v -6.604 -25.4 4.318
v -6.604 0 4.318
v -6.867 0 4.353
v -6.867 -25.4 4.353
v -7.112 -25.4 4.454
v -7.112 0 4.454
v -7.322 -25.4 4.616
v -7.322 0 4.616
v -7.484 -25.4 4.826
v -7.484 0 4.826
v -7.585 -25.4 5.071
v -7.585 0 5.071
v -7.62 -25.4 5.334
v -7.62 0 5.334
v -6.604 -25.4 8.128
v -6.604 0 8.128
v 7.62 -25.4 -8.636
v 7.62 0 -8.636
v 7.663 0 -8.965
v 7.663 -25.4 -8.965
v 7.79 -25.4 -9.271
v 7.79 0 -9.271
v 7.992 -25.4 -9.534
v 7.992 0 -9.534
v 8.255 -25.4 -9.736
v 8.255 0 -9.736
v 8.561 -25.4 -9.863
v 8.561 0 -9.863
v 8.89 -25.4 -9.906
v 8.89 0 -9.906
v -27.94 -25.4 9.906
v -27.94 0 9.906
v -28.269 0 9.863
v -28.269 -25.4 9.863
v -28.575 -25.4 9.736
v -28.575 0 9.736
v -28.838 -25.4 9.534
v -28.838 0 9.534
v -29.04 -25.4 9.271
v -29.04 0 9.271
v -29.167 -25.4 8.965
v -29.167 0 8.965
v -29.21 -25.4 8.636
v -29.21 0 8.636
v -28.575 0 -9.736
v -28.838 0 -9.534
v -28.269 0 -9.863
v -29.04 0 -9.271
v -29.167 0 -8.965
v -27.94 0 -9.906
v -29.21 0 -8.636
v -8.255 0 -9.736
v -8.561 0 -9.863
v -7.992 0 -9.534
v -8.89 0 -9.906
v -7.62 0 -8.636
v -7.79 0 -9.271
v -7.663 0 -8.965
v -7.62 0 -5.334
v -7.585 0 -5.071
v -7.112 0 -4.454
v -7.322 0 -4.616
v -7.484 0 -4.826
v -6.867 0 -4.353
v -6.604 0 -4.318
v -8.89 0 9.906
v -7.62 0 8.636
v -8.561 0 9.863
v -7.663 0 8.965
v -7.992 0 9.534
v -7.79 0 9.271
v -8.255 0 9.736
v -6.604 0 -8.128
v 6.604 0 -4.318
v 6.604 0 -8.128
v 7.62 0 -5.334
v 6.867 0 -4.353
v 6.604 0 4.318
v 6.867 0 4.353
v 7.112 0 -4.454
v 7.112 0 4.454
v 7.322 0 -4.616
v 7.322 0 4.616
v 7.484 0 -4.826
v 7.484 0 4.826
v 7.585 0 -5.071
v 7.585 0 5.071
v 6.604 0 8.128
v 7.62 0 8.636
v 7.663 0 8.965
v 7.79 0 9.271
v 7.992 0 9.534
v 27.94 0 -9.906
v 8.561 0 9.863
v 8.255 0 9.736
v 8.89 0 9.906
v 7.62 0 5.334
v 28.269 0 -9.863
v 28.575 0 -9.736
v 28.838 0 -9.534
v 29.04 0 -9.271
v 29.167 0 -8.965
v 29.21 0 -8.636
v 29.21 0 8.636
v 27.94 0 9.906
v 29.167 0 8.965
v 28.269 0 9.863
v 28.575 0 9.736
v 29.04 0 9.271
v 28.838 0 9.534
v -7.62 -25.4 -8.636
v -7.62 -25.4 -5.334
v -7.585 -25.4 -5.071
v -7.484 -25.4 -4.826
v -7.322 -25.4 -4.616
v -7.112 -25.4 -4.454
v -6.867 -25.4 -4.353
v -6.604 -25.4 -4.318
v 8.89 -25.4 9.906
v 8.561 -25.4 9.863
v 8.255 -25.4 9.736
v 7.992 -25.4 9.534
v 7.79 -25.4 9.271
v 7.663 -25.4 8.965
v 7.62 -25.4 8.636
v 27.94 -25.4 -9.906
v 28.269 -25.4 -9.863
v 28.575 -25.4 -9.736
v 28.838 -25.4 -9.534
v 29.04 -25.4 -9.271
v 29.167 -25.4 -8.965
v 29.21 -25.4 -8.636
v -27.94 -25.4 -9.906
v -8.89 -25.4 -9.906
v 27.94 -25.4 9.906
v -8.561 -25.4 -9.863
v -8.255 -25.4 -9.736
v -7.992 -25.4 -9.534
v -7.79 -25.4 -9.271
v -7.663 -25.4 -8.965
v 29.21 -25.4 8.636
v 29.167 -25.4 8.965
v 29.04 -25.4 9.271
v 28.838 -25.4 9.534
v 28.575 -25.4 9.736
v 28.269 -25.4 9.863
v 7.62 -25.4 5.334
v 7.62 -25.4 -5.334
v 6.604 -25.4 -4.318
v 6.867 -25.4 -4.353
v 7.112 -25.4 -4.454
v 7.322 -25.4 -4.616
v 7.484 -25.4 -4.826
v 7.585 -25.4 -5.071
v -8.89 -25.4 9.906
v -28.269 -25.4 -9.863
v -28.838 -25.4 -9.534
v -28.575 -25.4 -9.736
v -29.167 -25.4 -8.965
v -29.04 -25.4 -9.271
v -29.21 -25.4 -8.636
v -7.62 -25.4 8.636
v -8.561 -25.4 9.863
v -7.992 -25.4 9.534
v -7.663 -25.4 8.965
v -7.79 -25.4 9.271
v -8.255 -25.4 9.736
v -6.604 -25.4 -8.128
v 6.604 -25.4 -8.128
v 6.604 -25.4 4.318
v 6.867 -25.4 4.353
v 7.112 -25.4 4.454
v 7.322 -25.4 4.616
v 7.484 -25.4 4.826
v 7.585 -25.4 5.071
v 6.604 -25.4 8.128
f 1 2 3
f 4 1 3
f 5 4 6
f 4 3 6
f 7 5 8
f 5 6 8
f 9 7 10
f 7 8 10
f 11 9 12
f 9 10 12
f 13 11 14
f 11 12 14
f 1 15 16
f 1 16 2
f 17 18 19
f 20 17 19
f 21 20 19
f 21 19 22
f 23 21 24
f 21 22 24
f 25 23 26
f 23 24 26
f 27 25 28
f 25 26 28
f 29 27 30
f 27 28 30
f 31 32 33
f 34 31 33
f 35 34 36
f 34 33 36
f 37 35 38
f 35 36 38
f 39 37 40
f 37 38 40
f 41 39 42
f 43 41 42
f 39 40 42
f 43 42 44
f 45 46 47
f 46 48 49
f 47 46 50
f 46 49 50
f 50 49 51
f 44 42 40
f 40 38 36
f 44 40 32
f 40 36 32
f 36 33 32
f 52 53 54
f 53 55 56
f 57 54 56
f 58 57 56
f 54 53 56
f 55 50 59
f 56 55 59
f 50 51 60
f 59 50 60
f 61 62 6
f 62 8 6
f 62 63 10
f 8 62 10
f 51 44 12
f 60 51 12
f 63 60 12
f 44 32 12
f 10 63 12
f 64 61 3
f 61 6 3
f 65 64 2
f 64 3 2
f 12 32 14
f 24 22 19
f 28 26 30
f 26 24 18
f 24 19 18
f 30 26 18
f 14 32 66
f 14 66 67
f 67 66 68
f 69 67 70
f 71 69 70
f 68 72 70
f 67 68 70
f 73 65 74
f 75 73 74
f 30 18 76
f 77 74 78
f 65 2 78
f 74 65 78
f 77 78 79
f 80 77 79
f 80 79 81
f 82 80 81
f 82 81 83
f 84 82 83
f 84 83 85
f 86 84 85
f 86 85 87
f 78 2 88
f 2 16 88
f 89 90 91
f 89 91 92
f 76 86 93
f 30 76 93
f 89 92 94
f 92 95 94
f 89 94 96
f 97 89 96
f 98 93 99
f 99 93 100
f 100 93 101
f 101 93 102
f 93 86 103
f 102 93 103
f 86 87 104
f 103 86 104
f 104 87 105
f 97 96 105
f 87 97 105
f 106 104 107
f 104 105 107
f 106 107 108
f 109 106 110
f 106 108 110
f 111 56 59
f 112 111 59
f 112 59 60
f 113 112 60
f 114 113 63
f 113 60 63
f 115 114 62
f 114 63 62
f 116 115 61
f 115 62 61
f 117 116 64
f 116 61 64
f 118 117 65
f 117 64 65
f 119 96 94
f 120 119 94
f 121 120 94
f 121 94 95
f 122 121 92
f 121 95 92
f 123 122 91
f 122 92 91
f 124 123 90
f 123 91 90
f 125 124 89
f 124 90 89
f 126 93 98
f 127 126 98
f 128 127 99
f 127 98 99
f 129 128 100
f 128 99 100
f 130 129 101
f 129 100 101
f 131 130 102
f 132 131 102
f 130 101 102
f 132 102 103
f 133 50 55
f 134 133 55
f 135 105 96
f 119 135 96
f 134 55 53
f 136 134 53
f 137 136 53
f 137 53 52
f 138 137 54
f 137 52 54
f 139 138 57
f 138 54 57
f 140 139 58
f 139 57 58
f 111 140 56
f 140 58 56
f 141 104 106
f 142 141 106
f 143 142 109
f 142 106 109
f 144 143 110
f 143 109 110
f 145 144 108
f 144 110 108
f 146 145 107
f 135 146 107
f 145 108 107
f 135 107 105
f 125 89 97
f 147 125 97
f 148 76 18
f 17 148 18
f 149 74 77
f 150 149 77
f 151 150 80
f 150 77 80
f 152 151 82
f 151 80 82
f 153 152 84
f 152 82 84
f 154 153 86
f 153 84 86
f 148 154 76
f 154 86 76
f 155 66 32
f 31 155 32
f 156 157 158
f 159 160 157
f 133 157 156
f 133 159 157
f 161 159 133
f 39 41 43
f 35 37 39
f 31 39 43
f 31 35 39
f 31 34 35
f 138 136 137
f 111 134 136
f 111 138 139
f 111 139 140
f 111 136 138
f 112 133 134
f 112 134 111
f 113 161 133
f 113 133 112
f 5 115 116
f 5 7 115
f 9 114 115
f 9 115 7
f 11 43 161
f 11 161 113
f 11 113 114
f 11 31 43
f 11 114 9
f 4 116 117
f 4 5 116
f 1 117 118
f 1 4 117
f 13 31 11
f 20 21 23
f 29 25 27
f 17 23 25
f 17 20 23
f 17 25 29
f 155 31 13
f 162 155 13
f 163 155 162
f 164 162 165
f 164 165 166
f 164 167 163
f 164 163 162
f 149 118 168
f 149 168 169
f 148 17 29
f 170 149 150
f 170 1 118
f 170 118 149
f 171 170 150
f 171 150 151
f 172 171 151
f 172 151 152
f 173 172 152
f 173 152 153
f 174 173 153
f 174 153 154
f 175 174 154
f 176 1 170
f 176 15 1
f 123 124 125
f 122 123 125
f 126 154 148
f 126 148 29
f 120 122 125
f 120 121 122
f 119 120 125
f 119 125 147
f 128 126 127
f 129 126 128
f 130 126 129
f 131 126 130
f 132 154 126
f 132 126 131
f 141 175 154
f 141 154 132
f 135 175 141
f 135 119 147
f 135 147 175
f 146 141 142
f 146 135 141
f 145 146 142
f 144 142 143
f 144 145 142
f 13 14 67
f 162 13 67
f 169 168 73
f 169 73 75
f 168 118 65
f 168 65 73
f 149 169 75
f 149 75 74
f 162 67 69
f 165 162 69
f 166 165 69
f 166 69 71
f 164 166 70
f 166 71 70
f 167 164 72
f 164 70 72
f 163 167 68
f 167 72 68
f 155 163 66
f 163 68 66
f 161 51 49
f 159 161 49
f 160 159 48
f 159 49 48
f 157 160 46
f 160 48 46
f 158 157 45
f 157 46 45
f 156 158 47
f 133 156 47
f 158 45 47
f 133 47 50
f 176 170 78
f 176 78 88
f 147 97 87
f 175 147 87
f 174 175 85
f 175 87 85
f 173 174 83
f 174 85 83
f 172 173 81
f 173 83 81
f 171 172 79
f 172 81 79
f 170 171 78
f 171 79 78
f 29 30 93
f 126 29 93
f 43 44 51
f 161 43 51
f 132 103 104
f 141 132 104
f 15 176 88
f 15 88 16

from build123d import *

# Parameters (mm, degrees)
F1_DEPTH = 25.4


with BuildPart() as f1:
    # F0 (on Front) → F1 (new body)
    with BuildSketch(Plane.XZ):
        with BuildLine():
            Line((-29.21, 8.636), (-29.21, 0))
            Line((-29.21, 0), (-29.21, -8.636))
            ThreePointArc((-29.21, -8.636), (-28.838026, -9.534026), (-27.94, -9.906))
            Line((-27.94, -9.906), (-8.89, -9.906))
            ThreePointArc((-8.89, -9.906), (-7.991974, -9.534026), (-7.62, -8.636))
            Line((-7.62, -8.636), (-7.62, -5.334))
            ThreePointArc((-7.62, -5.334), (-7.32242, -4.61558), (-6.604, -4.318))
            Line((-6.604, -4.318), (-6.604, -8.128))
            Line((-6.604, -8.128), (0, -8.128))
            Line((0, -8.128), (6.604, -8.128))
            Line((6.604, -8.128), (6.604, -4.318))
            ThreePointArc((6.604, -4.318), (7.32242, -4.61558), (7.62, -5.334))
            Line((7.62, -5.334), (7.62, -8.636))
            ThreePointArc((7.62, -8.636), (7.991974, -9.534026), (8.89, -9.906))
            Line((8.89, -9.906), (27.94, -9.906))
            ThreePointArc((27.94, -9.906), (28.838026, -9.534026), (29.21, -8.636))
            Line((29.21, -8.636), (29.21, 0))
            Line((29.21, 0), (29.21, 8.636))
            ThreePointArc((29.21, 8.636), (28.838026, 9.534026), (27.94, 9.906))
            Line((27.94, 9.906), (8.89, 9.906))
            ThreePointArc((8.89, 9.906), (7.991974, 9.534026), (7.62, 8.636))
            Line((7.62, 8.636), (7.62, 5.334))
            ThreePointArc((7.62, 5.334), (7.32242, 4.61558), (6.604, 4.318))
            Line((6.604, 4.318), (6.604, 8.128))
            Line((6.604, 8.128), (0, 8.128))
            Line((0, 8.128), (-6.604, 8.128))
            Line((-6.604, 8.128), (-6.604, 4.318))
            ThreePointArc((-6.604, 4.318), (-7.32242, 4.61558), (-7.62, 5.334))
            Line((-7.62, 5.334), (-7.62, 8.636))
            ThreePointArc((-7.62, 8.636), (-7.991974, 9.534026), (-8.89, 9.906))
            Line((-8.89, 9.906), (-27.94, 9.906))
            ThreePointArc((-27.94, 9.906), (-28.838026, 9.534026), (-29.21, 8.636))
        make_face()
    extrude(amount=F1_DEPTH)


solid = f1.part
